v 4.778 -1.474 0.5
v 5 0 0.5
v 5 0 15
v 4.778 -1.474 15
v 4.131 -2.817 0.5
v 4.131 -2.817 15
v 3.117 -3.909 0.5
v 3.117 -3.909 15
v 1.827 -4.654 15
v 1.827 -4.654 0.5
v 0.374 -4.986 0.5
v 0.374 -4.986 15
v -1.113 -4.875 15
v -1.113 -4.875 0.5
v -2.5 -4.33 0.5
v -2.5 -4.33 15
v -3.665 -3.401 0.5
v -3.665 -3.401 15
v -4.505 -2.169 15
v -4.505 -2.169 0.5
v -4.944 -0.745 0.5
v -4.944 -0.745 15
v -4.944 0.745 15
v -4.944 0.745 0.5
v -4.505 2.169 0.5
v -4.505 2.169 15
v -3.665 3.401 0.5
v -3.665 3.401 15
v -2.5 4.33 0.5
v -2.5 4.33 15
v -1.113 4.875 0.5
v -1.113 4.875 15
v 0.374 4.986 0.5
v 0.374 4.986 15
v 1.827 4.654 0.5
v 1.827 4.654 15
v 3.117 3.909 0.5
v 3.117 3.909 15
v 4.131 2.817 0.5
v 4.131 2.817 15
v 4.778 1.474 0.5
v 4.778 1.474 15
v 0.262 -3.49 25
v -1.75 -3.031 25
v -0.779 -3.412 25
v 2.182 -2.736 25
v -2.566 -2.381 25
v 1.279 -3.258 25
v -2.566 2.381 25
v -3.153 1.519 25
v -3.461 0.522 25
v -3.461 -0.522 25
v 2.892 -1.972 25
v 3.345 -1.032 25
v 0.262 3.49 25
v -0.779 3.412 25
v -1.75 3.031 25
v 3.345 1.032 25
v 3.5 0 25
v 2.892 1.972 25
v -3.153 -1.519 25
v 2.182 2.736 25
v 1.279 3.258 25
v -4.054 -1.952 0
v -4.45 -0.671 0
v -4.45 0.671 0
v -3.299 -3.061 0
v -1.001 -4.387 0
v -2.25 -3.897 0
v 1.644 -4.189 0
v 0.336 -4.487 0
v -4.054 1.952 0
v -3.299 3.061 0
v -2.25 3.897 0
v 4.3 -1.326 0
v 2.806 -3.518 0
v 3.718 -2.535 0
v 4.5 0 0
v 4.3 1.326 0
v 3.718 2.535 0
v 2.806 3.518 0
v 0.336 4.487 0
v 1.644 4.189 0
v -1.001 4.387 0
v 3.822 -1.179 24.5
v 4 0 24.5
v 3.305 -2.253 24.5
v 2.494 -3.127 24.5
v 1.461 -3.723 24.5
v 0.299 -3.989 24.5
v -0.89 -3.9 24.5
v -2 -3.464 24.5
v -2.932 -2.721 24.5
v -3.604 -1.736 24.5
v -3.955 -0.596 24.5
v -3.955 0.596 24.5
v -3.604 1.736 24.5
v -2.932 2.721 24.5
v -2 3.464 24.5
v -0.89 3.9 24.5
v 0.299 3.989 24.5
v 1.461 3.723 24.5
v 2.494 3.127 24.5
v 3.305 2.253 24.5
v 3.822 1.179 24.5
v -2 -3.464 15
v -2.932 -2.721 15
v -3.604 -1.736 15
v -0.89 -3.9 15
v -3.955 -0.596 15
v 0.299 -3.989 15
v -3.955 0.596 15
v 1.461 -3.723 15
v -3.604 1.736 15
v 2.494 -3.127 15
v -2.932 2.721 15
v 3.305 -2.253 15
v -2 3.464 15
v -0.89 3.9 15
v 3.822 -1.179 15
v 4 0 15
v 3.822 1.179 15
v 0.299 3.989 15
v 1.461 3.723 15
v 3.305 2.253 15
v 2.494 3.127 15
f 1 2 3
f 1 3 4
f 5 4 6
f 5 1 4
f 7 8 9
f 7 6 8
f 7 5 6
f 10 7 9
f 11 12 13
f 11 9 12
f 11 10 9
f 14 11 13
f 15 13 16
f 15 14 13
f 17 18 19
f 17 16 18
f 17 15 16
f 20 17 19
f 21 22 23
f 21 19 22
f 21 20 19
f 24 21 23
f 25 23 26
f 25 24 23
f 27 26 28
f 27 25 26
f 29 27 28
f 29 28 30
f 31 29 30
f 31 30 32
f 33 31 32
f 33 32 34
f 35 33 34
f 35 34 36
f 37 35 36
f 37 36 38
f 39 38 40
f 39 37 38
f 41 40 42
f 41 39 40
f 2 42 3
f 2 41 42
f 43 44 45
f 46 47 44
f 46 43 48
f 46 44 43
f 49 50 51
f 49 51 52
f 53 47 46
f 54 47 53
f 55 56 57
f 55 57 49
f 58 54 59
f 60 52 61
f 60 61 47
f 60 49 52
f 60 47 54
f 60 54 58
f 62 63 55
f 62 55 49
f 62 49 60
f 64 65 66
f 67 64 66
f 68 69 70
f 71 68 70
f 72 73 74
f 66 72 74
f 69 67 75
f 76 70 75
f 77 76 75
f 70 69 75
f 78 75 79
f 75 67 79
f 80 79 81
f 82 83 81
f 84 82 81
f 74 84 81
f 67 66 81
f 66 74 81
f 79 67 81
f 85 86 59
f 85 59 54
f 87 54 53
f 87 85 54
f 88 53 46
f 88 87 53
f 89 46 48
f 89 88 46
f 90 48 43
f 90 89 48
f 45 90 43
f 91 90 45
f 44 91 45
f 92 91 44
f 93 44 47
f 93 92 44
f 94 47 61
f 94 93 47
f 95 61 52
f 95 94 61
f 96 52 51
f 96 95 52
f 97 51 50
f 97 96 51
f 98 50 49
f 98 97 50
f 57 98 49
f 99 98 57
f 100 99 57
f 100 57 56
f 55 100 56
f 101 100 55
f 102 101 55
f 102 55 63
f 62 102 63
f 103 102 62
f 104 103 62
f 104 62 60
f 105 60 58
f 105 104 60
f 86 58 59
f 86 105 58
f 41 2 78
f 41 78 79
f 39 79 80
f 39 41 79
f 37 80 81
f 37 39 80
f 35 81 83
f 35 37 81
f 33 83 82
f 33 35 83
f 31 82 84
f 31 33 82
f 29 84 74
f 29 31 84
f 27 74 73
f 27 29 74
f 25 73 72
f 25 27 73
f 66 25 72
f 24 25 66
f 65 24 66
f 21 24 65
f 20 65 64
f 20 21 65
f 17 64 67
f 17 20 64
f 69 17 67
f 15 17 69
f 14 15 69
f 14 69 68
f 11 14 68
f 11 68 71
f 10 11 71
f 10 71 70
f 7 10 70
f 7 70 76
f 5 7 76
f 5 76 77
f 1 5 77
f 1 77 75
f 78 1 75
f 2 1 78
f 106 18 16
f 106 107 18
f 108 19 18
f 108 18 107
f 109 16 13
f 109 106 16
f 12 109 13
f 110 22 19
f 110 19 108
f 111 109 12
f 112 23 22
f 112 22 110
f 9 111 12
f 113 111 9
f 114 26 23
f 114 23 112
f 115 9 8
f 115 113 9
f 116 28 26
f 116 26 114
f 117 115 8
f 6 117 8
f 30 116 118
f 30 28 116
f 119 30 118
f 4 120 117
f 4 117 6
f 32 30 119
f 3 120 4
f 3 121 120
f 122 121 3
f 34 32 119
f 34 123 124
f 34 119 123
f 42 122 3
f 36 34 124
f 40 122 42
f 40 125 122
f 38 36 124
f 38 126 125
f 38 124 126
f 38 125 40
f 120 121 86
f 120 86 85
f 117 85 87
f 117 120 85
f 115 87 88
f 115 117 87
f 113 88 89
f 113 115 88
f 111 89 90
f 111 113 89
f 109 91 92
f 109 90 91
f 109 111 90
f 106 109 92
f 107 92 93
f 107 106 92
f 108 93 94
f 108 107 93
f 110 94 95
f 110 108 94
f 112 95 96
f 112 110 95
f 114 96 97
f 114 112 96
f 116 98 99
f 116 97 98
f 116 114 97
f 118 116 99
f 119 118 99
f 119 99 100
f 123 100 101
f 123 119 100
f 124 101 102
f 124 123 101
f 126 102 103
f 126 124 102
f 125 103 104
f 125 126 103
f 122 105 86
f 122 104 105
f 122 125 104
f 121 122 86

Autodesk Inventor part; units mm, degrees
ref_plane "YZ Plane" through (0, 0, 0) normal (1, 0, 0) x (0, 1, 0)
ref_plane "XZ Plane" through (0, 0, 0) normal (0, 1, 0) x (-1, 0, 0)
ref_plane "XY Plane" through (0, 0, 0) normal (0, 0, 1) x (1, 0, 0)
sketch "Schizzo1" plane through (0, 0, 0) normal (0, 0, 1) x (1, 0, 0)
  circle A0 centre (0, 0) radius 5
  dimension "d0" = 10
extrude "Estrusione1" add sketch "Schizzo1" along normal blind 15
sketch "Schizzo2" plane through (0, 0, 15) normal (0, 0, 1) x (1, 0, 0)
  circle A0 centre (0, 0) radius 4
  dimension "d3" = 8
extrude "Estrusione2" add sketch "Schizzo2" along normal blind 10
thread "Filettatura1" size "M8x1.25" class "6g" standard "ANSI Metric M Profile" full length
chamfer "Smusso1" distance 0.5 angle 45 2 edges at (-4, 0, 25) (-5, 0, 0)
properties part number "Perno tendi motore" material "Acciaio inossidabile"
